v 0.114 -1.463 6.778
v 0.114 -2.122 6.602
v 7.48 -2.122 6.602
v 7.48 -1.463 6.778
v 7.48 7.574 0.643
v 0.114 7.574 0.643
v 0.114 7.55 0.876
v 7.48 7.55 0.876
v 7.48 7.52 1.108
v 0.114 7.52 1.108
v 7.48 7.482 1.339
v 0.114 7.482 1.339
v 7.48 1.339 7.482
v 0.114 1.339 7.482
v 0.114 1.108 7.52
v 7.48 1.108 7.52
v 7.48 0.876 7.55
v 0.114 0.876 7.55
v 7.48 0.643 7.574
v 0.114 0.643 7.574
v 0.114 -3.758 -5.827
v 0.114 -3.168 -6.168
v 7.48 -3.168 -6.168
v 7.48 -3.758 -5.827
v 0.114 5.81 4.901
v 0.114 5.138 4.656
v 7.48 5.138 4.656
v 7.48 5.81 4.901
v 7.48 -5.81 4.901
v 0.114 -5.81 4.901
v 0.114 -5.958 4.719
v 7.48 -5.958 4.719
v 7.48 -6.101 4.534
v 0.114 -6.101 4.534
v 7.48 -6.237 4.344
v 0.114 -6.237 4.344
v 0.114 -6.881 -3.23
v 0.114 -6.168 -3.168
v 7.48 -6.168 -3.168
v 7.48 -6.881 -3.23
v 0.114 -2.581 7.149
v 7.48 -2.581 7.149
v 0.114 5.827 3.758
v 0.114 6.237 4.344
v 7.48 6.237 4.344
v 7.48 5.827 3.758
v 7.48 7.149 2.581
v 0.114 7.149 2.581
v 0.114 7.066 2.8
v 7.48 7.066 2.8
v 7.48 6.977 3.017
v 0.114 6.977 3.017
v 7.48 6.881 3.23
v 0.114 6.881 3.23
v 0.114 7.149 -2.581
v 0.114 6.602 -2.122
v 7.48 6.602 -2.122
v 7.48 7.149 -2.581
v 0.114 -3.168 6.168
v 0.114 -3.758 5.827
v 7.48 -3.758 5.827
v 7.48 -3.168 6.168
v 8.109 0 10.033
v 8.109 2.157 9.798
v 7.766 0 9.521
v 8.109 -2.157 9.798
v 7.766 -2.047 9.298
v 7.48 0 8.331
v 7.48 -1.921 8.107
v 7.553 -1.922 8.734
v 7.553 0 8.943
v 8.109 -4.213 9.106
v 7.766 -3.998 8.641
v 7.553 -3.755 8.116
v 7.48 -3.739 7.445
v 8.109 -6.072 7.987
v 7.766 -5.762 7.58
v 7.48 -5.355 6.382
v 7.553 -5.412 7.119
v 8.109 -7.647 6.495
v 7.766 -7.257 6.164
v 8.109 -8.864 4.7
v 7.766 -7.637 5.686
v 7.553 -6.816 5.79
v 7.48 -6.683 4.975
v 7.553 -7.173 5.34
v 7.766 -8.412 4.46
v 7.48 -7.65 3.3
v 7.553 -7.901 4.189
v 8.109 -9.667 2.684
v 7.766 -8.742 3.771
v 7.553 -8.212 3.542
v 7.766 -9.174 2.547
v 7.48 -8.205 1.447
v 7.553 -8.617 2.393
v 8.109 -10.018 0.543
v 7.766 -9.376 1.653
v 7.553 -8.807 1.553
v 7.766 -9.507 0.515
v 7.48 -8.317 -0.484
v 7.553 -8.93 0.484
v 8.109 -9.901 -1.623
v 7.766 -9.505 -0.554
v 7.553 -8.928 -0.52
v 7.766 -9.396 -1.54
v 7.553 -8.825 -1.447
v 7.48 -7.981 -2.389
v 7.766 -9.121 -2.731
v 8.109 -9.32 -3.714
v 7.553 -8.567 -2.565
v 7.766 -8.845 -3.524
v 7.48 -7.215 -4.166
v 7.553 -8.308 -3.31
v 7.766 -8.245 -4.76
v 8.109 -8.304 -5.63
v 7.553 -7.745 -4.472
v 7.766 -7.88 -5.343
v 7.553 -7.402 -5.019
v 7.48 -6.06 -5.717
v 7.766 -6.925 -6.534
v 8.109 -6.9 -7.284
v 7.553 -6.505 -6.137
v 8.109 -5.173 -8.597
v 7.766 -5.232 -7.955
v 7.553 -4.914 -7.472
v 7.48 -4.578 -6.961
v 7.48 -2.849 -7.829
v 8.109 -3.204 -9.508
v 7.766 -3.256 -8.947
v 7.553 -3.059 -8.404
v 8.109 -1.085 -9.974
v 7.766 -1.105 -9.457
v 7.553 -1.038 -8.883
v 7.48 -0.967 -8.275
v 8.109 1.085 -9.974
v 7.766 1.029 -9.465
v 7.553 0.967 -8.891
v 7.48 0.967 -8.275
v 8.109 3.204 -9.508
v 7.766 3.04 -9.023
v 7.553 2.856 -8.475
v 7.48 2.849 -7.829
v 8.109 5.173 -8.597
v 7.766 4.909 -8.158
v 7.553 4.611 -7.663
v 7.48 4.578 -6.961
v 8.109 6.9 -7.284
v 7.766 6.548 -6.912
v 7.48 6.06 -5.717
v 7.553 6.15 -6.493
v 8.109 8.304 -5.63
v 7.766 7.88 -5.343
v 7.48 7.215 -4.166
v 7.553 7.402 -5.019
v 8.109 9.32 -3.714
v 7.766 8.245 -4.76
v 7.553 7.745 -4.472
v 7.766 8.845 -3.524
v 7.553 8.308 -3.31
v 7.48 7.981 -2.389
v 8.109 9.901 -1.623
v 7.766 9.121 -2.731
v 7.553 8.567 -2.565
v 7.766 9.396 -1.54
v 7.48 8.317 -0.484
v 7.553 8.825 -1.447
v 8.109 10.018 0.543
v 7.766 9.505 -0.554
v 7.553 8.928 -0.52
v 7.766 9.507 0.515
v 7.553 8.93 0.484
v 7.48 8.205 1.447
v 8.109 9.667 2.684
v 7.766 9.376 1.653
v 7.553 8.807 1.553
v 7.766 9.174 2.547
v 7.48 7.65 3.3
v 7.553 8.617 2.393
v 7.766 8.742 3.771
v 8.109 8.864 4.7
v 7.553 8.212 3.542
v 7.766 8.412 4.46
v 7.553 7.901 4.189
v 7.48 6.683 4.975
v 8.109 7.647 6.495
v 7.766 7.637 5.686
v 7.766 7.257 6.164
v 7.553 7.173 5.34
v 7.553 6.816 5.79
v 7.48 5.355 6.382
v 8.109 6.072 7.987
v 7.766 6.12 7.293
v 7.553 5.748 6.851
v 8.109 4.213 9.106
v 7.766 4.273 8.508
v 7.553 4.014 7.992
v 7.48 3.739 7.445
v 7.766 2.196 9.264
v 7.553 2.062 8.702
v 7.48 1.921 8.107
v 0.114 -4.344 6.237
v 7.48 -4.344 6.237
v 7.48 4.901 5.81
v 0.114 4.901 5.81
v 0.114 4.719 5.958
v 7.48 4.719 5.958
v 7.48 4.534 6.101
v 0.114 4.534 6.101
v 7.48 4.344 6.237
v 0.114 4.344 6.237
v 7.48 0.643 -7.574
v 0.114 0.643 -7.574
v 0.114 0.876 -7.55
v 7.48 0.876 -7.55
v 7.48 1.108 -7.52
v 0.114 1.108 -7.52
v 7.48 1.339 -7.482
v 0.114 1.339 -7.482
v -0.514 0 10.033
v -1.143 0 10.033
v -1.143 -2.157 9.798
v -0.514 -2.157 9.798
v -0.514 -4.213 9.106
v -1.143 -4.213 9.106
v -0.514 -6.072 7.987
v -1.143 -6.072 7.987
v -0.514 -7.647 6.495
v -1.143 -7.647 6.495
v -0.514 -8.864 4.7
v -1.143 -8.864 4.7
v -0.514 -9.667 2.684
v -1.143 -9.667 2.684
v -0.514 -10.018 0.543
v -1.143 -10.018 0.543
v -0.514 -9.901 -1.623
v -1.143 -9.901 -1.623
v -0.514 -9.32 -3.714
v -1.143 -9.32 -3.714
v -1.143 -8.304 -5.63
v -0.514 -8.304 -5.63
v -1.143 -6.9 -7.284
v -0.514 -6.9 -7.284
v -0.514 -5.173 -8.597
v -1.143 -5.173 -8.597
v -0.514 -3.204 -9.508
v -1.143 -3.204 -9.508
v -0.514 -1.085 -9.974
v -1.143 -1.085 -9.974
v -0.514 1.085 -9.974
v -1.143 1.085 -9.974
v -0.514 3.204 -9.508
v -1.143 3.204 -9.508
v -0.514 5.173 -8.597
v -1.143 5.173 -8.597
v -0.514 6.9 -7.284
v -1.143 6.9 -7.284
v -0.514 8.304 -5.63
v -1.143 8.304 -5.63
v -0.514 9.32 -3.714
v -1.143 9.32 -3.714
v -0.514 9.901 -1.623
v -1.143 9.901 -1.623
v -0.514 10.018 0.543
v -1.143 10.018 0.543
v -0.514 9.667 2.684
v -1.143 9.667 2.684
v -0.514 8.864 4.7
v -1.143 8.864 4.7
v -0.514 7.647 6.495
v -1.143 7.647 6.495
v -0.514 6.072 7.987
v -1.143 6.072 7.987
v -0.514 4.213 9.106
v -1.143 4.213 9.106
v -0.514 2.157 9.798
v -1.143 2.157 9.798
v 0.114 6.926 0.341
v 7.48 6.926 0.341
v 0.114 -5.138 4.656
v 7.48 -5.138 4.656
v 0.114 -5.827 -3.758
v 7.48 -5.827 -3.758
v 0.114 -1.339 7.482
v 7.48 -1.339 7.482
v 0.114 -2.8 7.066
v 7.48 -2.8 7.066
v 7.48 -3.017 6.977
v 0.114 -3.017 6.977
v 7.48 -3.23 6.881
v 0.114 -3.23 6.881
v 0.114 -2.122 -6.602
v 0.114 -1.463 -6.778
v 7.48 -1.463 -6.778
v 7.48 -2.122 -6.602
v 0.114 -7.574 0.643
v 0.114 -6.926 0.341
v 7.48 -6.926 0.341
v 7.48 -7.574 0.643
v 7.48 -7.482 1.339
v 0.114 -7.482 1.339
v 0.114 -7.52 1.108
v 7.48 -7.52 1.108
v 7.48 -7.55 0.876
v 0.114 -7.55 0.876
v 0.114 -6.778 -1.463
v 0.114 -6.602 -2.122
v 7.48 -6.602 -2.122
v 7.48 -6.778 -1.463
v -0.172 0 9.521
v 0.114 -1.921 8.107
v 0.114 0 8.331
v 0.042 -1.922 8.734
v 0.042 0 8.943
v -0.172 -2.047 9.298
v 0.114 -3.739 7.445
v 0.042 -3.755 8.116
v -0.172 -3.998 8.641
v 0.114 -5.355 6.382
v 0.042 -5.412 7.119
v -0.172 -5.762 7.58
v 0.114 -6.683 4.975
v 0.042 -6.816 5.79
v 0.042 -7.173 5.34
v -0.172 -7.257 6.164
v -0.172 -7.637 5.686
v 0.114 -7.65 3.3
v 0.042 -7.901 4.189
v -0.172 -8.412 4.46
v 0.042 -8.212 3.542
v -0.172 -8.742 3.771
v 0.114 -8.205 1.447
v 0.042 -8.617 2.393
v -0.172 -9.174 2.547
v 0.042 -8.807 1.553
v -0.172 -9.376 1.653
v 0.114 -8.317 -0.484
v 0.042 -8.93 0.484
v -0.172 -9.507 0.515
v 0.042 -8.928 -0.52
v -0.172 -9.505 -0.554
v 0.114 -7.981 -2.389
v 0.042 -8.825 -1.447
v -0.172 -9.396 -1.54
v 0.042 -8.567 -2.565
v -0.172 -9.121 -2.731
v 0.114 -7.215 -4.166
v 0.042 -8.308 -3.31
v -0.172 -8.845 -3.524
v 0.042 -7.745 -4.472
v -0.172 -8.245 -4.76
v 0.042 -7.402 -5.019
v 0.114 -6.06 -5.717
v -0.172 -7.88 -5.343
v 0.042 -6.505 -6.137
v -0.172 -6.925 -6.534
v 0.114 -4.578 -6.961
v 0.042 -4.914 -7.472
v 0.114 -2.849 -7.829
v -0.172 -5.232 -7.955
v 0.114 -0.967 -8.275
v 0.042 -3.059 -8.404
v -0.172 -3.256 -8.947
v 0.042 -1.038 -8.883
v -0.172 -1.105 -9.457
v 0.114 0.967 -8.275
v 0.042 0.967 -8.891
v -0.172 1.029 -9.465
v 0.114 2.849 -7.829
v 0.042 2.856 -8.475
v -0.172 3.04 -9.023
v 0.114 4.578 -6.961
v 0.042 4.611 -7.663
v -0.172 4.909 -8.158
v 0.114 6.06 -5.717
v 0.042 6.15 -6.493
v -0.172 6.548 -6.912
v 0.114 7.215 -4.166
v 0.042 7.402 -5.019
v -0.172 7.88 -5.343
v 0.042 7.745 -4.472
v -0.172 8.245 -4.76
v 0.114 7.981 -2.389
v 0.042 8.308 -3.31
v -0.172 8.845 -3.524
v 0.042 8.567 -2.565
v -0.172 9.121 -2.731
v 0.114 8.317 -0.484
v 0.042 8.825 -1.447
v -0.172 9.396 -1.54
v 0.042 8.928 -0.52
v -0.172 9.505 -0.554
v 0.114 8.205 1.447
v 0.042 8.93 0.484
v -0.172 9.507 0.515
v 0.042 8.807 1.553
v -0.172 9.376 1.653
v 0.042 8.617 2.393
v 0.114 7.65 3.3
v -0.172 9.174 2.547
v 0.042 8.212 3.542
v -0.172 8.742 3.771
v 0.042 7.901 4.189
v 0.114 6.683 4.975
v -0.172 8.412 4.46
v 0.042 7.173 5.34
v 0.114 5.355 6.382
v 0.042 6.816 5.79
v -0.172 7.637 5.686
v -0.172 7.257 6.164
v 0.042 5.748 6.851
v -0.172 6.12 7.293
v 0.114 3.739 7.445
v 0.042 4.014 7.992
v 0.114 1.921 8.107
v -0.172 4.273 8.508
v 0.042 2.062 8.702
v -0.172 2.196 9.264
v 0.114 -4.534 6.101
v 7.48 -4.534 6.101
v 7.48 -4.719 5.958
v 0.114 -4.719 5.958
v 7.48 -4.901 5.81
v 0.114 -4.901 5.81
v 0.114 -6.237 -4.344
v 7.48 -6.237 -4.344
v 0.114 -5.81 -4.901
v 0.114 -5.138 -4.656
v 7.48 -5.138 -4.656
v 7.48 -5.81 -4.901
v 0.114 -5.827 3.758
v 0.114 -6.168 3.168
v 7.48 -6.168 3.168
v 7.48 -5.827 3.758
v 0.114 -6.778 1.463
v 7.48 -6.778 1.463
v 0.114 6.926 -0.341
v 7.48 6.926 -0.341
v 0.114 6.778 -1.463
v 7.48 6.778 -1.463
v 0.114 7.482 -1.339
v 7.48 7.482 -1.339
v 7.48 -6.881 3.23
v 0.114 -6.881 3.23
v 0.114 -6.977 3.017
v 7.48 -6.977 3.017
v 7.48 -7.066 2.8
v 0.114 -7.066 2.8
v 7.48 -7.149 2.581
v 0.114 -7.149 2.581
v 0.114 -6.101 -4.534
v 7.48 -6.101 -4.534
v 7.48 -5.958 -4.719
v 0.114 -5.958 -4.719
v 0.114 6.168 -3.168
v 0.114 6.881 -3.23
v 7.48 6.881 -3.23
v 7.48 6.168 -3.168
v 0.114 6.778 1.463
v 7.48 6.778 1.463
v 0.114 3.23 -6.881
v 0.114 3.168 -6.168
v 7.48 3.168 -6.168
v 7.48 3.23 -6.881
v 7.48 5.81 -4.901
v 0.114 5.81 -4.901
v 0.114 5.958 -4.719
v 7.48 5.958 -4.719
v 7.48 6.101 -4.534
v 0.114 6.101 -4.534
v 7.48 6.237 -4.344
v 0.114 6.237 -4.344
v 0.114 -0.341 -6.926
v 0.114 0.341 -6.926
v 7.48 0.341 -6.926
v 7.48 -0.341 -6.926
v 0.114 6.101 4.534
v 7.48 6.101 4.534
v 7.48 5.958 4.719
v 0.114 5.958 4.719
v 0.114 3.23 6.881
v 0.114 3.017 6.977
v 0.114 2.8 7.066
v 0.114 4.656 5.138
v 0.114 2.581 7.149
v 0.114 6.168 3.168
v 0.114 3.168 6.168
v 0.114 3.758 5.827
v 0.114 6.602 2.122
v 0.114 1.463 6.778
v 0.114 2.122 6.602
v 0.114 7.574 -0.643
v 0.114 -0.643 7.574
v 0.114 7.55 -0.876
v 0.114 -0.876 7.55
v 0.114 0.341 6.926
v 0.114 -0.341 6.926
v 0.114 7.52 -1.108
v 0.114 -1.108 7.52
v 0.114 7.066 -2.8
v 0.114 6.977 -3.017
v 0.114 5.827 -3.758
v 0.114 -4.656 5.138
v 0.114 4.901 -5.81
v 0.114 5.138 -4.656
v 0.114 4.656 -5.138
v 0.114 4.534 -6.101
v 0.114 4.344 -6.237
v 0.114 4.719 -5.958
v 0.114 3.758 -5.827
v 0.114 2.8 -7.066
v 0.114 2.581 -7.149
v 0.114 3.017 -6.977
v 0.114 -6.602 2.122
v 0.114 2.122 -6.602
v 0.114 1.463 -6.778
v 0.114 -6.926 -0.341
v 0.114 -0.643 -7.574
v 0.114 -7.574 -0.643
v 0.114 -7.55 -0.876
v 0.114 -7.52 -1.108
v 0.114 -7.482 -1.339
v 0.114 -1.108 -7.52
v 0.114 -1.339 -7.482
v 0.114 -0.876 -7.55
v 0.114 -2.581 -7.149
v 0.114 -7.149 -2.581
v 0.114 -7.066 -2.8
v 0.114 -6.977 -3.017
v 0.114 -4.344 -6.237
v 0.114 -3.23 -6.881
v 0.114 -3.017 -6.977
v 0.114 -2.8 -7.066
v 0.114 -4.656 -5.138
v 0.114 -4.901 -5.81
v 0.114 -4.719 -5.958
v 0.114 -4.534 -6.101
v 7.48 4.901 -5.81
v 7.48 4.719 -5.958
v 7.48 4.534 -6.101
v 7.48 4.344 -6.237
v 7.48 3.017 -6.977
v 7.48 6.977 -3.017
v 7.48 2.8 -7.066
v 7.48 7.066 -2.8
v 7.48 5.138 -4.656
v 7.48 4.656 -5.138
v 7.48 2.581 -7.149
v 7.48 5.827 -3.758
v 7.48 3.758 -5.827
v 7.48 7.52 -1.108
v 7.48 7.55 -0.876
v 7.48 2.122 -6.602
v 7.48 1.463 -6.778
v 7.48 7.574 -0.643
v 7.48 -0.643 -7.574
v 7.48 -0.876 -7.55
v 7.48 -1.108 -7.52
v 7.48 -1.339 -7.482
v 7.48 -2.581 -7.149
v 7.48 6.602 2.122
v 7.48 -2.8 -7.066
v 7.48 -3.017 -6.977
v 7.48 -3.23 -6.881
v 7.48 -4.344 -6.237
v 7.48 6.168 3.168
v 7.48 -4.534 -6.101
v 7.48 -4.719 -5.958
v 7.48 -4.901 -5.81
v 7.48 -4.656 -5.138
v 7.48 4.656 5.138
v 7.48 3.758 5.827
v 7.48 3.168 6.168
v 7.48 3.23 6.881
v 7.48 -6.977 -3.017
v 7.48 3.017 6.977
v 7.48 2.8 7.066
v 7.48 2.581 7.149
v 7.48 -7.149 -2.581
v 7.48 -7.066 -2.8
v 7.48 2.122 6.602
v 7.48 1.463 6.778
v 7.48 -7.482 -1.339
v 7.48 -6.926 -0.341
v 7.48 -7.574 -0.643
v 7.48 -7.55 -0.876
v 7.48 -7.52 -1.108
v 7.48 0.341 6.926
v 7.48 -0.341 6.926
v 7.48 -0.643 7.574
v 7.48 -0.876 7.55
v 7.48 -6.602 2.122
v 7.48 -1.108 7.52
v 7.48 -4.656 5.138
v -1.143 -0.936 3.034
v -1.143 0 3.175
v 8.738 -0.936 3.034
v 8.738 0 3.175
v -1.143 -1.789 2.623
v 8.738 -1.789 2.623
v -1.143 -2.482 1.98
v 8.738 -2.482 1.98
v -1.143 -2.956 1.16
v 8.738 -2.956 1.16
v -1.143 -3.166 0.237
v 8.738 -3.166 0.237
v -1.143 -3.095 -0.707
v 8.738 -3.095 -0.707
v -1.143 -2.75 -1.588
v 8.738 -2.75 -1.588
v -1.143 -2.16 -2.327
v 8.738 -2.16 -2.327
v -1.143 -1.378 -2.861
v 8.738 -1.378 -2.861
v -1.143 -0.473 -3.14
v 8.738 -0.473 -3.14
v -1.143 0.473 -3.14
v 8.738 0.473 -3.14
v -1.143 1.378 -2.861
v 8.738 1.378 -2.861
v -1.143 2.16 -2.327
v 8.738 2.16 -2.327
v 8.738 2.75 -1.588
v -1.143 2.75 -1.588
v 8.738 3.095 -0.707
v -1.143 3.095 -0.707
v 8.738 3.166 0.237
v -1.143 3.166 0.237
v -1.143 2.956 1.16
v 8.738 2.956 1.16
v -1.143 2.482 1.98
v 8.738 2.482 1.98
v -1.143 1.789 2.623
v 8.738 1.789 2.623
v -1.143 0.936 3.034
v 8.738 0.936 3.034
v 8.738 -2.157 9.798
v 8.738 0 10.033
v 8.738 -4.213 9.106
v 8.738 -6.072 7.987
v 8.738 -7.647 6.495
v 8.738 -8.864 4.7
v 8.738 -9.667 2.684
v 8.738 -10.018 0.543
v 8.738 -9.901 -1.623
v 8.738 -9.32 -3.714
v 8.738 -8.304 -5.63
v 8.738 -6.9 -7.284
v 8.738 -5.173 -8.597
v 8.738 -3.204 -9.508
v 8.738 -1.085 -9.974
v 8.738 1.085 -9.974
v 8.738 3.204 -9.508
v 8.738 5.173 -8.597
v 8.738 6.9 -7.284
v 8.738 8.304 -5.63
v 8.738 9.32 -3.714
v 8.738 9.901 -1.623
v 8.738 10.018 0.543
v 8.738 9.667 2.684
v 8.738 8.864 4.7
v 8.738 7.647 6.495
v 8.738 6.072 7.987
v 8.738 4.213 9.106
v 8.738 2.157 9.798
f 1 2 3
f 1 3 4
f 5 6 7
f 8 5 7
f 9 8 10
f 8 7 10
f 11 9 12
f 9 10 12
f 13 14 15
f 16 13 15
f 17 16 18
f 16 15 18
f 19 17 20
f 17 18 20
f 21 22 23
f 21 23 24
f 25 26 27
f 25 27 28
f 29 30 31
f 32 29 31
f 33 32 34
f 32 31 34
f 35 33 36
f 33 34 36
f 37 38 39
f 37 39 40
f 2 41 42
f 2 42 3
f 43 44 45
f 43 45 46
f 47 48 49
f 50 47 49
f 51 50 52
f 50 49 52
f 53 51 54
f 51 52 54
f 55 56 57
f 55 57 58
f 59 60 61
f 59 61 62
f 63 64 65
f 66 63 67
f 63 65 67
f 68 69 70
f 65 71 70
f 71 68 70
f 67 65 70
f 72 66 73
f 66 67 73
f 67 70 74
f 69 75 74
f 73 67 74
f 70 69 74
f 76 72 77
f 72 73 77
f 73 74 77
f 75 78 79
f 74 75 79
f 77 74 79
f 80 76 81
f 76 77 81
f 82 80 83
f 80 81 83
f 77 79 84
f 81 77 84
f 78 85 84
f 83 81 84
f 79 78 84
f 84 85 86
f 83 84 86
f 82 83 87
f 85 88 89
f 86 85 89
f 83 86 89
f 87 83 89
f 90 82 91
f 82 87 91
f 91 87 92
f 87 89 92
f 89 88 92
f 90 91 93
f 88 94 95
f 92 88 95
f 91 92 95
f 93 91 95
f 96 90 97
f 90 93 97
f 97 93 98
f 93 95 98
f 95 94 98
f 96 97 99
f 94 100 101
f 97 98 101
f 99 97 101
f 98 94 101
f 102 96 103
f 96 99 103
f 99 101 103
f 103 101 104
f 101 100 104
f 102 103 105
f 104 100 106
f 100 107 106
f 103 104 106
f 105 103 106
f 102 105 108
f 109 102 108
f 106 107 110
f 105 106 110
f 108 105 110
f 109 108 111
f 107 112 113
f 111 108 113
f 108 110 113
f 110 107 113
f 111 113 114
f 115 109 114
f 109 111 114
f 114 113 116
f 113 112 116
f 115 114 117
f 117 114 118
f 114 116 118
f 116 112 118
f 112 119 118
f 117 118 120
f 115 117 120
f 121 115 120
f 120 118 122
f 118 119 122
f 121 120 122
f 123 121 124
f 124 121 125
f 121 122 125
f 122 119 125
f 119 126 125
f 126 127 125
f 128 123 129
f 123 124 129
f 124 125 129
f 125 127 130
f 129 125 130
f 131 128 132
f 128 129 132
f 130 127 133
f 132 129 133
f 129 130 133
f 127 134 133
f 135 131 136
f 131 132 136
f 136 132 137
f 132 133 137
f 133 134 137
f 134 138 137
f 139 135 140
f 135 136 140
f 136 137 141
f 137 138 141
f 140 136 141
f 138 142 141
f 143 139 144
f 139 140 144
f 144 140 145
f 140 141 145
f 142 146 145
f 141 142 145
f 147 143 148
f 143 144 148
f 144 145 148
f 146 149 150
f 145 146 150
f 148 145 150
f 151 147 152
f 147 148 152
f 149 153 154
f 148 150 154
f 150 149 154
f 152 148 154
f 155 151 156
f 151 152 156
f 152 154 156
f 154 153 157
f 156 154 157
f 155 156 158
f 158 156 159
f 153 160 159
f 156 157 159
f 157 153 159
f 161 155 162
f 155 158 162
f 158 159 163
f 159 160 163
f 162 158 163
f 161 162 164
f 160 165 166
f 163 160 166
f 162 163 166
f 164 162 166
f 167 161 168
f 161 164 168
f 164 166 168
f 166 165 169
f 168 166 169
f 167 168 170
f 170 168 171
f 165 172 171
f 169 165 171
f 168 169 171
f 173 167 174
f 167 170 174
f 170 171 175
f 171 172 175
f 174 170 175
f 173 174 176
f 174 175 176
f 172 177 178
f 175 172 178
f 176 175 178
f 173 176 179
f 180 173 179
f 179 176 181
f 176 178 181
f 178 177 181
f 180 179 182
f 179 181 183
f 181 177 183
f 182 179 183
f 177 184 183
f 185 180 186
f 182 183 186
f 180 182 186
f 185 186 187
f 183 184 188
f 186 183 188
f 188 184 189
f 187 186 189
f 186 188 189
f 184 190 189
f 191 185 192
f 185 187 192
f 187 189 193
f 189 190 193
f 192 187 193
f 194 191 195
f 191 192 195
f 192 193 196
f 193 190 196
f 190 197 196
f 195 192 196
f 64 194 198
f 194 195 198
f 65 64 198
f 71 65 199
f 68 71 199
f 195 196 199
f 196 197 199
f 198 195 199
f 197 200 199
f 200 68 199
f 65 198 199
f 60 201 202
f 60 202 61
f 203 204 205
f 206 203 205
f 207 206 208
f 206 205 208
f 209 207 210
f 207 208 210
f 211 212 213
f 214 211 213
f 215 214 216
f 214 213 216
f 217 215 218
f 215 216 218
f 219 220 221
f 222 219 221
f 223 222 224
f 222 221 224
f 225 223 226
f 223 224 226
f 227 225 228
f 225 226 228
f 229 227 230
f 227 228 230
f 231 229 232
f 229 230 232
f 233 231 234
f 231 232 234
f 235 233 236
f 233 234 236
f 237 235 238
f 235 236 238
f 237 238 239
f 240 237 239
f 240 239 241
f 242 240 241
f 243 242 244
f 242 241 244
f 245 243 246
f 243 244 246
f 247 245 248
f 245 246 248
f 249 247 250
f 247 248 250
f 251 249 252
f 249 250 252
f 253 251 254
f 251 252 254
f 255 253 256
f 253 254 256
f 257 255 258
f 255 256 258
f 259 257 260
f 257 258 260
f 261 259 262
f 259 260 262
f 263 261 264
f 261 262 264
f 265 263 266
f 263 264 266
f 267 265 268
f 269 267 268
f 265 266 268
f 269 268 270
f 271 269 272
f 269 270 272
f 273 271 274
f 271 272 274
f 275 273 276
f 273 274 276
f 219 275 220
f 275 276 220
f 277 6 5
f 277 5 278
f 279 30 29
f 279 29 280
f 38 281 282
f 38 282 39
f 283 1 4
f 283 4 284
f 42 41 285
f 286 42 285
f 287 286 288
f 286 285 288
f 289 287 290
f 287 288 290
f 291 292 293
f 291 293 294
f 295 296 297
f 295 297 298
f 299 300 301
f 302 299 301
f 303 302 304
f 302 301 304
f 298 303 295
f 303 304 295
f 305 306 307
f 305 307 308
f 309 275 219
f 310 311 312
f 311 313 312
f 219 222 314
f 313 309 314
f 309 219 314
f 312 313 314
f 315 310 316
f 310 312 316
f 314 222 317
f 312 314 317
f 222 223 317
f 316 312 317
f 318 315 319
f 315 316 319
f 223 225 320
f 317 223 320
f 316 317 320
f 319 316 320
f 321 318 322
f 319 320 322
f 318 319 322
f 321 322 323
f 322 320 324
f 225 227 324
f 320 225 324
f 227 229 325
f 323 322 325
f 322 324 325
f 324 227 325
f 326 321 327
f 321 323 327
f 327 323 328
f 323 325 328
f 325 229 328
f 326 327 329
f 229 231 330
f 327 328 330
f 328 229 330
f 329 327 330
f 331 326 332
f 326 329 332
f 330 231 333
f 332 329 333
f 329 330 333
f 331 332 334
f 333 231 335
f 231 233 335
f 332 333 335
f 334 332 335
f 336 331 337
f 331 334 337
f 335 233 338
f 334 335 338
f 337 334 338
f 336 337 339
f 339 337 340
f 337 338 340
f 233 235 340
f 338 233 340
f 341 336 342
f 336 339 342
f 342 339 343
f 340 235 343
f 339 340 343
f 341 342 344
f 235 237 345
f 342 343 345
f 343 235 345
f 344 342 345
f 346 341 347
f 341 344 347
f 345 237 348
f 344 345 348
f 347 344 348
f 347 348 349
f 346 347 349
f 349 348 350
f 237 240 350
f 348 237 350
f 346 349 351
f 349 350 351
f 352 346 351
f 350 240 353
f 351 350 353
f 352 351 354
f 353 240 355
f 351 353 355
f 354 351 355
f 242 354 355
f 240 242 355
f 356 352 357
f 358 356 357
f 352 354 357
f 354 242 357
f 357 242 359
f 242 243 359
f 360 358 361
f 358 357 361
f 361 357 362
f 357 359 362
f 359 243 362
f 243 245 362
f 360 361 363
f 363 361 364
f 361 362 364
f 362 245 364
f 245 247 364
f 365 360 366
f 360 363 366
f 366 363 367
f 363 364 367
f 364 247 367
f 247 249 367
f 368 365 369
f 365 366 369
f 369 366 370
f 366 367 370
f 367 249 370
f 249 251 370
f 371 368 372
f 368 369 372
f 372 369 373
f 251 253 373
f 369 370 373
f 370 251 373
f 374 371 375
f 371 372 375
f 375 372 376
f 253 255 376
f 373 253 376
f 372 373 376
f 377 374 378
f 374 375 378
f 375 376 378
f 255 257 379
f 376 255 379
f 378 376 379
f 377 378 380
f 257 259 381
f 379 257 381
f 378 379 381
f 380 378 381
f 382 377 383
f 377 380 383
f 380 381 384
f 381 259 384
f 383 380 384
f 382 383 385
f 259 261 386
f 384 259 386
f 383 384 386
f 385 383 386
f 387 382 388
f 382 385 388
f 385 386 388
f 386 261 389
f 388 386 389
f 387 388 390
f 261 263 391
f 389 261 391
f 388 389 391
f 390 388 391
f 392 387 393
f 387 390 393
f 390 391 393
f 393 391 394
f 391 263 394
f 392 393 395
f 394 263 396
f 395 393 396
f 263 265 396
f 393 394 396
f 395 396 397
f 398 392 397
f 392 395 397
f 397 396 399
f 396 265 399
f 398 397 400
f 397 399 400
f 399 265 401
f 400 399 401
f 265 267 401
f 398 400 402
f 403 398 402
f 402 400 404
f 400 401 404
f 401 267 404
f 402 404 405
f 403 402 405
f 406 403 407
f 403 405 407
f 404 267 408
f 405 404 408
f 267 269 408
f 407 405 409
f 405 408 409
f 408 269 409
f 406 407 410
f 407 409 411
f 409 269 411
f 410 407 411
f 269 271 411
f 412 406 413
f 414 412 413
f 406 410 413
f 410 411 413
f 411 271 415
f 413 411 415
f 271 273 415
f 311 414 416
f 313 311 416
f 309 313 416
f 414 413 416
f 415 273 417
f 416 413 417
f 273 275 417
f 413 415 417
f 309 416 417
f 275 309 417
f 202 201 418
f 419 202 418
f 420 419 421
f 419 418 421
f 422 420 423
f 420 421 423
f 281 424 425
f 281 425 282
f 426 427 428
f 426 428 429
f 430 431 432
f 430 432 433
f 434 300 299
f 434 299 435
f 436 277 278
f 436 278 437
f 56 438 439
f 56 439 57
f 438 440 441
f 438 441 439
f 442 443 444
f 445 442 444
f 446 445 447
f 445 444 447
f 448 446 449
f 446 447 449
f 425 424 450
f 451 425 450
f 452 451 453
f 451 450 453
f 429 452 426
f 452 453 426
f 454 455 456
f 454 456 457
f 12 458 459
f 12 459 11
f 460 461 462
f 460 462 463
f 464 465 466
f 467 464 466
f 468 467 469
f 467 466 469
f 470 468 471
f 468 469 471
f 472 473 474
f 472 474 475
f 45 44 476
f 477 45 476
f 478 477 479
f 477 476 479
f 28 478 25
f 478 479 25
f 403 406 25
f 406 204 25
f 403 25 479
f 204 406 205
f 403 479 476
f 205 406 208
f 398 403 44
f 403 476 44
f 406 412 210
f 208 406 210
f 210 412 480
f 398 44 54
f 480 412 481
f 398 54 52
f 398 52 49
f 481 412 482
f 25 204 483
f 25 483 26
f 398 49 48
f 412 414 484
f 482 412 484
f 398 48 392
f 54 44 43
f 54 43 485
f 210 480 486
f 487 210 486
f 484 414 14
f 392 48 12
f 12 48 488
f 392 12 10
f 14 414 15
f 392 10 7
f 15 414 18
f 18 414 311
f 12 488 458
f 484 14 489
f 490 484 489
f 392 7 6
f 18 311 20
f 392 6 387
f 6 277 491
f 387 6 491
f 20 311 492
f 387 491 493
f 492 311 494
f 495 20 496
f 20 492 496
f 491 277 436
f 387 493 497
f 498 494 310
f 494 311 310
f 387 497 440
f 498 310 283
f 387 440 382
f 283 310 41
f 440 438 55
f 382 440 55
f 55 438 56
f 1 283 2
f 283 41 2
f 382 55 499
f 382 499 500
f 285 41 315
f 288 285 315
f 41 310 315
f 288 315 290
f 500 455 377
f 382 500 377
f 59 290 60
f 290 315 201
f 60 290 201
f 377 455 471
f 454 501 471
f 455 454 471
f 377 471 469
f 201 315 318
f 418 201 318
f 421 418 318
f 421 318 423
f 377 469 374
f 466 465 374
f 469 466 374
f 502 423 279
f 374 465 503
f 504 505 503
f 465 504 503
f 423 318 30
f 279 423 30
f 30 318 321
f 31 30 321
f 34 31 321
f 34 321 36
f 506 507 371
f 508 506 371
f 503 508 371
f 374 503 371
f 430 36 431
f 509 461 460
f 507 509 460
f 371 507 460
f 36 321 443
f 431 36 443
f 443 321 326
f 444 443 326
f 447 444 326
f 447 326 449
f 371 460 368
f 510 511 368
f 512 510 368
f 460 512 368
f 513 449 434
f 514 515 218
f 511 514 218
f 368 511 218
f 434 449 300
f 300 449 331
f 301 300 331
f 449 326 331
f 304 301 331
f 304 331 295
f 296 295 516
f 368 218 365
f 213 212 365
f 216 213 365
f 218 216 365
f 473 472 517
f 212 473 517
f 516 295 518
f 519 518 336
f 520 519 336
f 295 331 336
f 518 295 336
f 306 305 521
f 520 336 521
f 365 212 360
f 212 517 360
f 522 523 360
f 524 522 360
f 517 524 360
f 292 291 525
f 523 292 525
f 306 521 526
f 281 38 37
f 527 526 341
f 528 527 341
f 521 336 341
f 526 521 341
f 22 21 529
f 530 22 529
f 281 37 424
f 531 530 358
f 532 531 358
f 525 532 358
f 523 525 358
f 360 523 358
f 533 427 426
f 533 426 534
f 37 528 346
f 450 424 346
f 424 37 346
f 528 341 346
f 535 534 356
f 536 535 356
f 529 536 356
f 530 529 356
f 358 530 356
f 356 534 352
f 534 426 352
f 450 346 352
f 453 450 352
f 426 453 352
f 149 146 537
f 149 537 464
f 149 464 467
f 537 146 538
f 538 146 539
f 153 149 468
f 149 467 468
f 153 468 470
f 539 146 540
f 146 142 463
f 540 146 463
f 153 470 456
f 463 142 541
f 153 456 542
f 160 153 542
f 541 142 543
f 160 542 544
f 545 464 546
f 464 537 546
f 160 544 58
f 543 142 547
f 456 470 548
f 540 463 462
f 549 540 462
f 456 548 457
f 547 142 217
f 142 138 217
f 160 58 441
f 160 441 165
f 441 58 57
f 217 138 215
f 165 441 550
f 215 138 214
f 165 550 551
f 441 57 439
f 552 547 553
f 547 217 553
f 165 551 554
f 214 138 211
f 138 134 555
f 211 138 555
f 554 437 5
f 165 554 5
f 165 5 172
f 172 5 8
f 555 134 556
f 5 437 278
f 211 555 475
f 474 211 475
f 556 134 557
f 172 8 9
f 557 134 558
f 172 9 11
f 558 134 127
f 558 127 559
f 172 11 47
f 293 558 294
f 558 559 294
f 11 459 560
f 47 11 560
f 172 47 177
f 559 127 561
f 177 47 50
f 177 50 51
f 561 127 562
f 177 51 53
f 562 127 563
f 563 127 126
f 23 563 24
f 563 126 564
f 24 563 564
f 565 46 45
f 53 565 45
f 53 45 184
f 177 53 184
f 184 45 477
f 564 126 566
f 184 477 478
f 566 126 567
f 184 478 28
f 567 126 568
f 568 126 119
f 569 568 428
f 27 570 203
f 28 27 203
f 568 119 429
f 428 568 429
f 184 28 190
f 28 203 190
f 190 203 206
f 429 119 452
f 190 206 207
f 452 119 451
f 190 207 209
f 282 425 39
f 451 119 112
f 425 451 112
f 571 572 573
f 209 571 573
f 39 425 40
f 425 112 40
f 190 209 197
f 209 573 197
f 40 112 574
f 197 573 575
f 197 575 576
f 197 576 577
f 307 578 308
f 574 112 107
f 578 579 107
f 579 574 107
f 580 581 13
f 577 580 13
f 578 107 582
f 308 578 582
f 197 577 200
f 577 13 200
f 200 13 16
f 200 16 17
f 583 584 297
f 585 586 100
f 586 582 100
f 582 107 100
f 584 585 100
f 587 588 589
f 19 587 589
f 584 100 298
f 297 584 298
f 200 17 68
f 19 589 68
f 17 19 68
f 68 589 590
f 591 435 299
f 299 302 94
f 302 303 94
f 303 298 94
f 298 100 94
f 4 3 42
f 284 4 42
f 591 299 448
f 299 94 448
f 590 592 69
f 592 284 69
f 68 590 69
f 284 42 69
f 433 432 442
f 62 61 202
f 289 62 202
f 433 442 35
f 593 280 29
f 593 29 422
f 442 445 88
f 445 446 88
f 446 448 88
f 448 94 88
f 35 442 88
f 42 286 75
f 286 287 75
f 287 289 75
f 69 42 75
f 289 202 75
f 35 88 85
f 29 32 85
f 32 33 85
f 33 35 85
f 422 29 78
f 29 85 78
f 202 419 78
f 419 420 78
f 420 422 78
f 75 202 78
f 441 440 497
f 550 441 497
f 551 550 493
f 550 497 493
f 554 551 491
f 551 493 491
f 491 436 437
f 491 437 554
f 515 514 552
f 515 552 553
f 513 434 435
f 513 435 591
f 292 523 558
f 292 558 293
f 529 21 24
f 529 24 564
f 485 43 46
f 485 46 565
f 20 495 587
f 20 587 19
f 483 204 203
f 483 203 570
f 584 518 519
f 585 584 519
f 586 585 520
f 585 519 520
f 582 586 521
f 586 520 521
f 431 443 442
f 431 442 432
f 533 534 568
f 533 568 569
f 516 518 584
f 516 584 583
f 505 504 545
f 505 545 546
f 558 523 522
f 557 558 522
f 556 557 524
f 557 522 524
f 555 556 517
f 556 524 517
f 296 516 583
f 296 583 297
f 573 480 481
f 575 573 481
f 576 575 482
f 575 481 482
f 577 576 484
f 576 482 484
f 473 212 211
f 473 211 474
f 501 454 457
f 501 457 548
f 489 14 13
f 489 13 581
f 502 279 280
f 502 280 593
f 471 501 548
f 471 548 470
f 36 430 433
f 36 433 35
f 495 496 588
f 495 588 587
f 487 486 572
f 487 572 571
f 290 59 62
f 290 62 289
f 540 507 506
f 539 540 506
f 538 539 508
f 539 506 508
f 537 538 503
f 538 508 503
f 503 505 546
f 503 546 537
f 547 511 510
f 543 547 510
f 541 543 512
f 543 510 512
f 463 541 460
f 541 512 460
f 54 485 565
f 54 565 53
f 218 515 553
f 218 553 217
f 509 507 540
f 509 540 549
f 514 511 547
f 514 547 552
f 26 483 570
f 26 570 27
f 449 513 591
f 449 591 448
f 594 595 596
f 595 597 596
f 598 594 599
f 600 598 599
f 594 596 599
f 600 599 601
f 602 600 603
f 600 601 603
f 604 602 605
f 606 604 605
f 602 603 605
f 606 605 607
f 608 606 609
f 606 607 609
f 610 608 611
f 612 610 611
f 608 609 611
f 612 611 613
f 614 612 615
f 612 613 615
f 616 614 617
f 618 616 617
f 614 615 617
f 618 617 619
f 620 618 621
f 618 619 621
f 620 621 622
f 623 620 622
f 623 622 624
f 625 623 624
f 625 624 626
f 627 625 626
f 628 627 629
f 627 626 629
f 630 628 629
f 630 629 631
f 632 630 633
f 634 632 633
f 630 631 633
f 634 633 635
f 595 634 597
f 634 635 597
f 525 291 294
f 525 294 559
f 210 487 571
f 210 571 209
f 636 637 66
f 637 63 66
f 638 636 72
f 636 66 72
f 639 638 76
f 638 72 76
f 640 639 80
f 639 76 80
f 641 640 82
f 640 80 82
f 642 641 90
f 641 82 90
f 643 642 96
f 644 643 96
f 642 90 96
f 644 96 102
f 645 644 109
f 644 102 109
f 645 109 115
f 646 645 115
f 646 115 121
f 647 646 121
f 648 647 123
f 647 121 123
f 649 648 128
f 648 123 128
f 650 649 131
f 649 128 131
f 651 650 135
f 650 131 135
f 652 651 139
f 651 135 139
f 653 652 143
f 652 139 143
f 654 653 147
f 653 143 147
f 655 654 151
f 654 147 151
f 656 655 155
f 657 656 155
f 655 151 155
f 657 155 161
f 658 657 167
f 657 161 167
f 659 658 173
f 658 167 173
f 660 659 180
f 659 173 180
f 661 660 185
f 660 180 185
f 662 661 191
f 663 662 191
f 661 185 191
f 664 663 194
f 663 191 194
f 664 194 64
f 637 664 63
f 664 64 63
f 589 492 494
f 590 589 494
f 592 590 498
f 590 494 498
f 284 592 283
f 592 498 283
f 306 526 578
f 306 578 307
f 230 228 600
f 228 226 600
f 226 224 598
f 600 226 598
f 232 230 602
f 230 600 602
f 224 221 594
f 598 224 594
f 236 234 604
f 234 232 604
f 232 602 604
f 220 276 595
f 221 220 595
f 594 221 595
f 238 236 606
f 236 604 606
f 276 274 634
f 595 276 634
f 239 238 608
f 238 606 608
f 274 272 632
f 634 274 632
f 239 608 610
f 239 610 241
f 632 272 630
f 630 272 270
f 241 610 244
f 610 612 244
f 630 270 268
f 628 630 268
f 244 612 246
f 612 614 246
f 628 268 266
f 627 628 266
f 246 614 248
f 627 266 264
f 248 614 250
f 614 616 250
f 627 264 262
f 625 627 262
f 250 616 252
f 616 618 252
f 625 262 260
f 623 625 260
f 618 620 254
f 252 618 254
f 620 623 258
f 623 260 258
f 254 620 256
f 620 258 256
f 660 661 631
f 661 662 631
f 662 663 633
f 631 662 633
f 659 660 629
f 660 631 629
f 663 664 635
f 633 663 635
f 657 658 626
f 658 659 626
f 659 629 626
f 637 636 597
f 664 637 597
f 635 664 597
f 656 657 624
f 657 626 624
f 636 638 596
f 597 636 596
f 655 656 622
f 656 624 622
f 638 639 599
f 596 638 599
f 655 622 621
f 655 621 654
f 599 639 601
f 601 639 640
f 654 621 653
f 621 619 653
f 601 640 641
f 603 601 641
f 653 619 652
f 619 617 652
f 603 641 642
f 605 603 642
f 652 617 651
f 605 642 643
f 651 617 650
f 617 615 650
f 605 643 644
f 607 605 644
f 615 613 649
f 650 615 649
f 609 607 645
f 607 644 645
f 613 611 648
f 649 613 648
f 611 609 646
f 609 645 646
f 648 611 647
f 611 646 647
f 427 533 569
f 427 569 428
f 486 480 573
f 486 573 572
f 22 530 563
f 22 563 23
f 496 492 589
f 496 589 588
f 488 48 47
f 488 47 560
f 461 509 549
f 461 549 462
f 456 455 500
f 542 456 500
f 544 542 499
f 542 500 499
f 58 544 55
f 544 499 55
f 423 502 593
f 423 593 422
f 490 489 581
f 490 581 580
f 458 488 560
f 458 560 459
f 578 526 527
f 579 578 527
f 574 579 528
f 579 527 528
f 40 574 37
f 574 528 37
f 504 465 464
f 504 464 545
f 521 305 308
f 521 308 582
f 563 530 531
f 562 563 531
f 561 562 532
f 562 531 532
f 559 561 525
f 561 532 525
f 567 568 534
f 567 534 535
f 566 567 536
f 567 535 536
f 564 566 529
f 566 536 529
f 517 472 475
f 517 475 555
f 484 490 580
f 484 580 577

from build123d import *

# Parameters (mm, degrees)
SKETCH4_R          = 7.7597
SKETCH4_R_2        = 7.60095
CUT_EXTRUDE2_DEPTH = 7.366
CUT_EXTRUDE1_DEPTH = 7.366
CIRPATTERN1_COUNT  = 24
SKETCH6_R          = 1.4605
CUT_EXTRUDE3_DEPTH = 17.66336796
CUT_EXTRUDE4_DEPTH = 1.016
CIRPATTERN2_COUNT  = 2
CIRPATTERN2_ANGLE  = 90
CIRPATTERN3_COUNT  = 2
CIRPATTERN3_ANGLE  = 90
SKETCH9_W          = 8.047950053
SKETCH9_H          = 15.828316952
CUT_EXTRUDE5_DEPTH = 7.62


with BuildPart() as part:
    # Sketch1 → Revolve1 (revolve)
    with BuildSketch(Plane.XY, mode=Mode.PRIVATE) as revolve1_sk:
        with BuildLine():
            Line((-8.7376, 3.175), (8.7376, 3.175))
            Line((8.7376, 3.175), (8.7376, 10.033))
            Line((8.7376, 10.033), (8.10895, 10.033))
            ThreePointArc((8.10895, 10.033), (7.642486723, 9.238300334), (7.4803, 8.3312))
            Line((7.4803, 8.3312), (7.4803, 7.7597))
            Line((7.4803, 7.7597), (0.1143, 7.7597))
            Line((0.1143, 7.7597), (0.1143, 8.3312))
            ThreePointArc((0.1143, 8.3312), (-0.047886723, 9.238300334), (-0.51435, 10.033))
            Line((-0.51435, 10.033), (-1.143, 10.033))
            Line((-1.143, 10.033), (-1.143, 5.6134))
            Line((-1.143, 5.6134), (-8.7376, 5.6134))
            Line((-8.7376, 5.6134), (-8.7376, 3.175))
        make_face()
    revolve(revolve1_sk.sketch.rotate(Axis((-8.7376, 0, 0), (1, 0, 0)), 90), axis=Axis((-8.7376, 0, 0), (1, 0, 0)))

    # Sketch4 → Cut-Extrude2 (cut)
    with BuildSketch(Plane(origin=(0.1143, 0, 0), x_dir=(0, 0, -1), z_dir=(1, 0, 0))):
        Circle(SKETCH4_R)
        Circle(SKETCH4_R_2, mode=Mode.SUBTRACT)
    extrude(amount=CUT_EXTRUDE2_DEPTH, mode=Mode.SUBTRACT)

    # Sketch3 → Cut-Extrude1 (cut)
    with BuildSketch(Plane(origin=(0.1143, 0, 0), x_dir=(0, 0, -1), z_dir=(1, 0, 0))):
        with BuildLine():
            Line((-0.643066132, 7.57369836), (-0.340952079, 6.925812683))
            Line((-0.340952079, 6.925812683), (0.340952079, 6.925812683))
            Line((0.340952079, 6.925812683), (0.643066132, 7.57369836))
            ThreePointArc((0.643066132, 7.57369836), (0, 7.60095), (-0.643066132, 7.57369836))
        make_face()
    cut_extrude1 = extrude(amount=CUT_EXTRUDE1_DEPTH, mode=Mode.SUBTRACT)

    # CirPattern1: Cut-Extrude1 ×24 about axis
    cirpattern1_axis = Axis((0, 0, 0), (1, 0, 0))
    for i in range(1, CIRPATTERN1_COUNT):
        add(cut_extrude1.rotate(cirpattern1_axis, i * 360 / CIRPATTERN1_COUNT), mode=Mode.SUBTRACT)

    # Sketch6 → Cut-Extrude3 (cut, through all)
    with BuildSketch(Plane(origin=(0, 0, 0), x_dir=(1, 0, 0), z_dir=(0, 1, 0))):
        with Locations(Location((-4.9403, 0, 0), (0, 0, 90))):
            Circle(SKETCH6_R)
    cut_extrude3 = extrude(amount=CUT_EXTRUDE3_DEPTH, mode=Mode.SUBTRACT)

    # CirPattern2: Cut-Extrude3 ×2 about axis
    cirpattern2_axis = Axis((-8.7376, 0, 0), (1, 0, 0))
    for i in range(1, CIRPATTERN2_COUNT):
        add(cut_extrude3.rotate(cirpattern2_axis, i * CIRPATTERN2_ANGLE / (CIRPATTERN2_COUNT - 1)), mode=Mode.SUBTRACT)


with BuildPart() as body_2:
    # Sketch7 → Revolve2 (revolve)
    with BuildSketch(Plane.XY, mode=Mode.PRIVATE) as revolve2_sk:
        Polygon((-6.1087, 5.6134), (-4.9403, 5.6134), (-4.9403, 3.556), (-6.1087, 3.556), (-6.3627, 3.81), (-6.3627, 5.3594), align=None)
    revolve(revolve2_sk.sketch.rotate(Axis((-4.9403, 3.556, 0), (0, 1, 0)), 270), axis=Axis((-4.9403, 3.556, 0), (0, 1, 0)))

    # Sketch8 → Cut-Extrude4 (cut)
    with BuildSketch(Plane(origin=(0, 5.6134, 0), x_dir=(1, 0, 0), z_dir=(0, 1, 0))):
        Polygon((-4.9403, 0.821223023), (-5.6515, 0.410611511), (-5.6515, -0.410611511), (-4.9403, -0.821223023), (-4.2291, -0.410611511), (-4.2291, 0.410611511), align=None)
    extrude(amount=-CUT_EXTRUDE4_DEPTH, mode=Mode.SUBTRACT)


with BuildPart() as cirpattern3_1:
    # CirPattern3: pattern copy
    add(body_2.part.rotate(Axis((0, 0, 0), (1, 0, 0)), 1 * CIRPATTERN3_ANGLE / (CIRPATTERN3_COUNT - 1)))


with BuildPart() as cut_extrude5_tool:
    # Sketch9 → Cut-Extrude5 (new, symmetric)
    with BuildSketch(Plane(origin=(0, 0, 0), x_dir=(1, 0, 0), z_dir=(0, 1, 0))):
        with Locations((-5.166975027, 0.16569051)):
            Rectangle(SKETCH9_W, SKETCH9_H)
    extrude(amount=CUT_EXTRUDE5_DEPTH, both=True)


with BuildPart() as part_1:
    add(part.part)

    # Cut-Extrude5: cut by cut_extrude5_tool
    add(cut_extrude5_tool.part, mode=Mode.SUBTRACT)


with BuildPart() as body_2_1:
    add(body_2.part)

    # Cut-Extrude5: cut by cut_extrude5_tool
    add(cut_extrude5_tool.part, mode=Mode.SUBTRACT)


with BuildPart() as cirpattern3_1_1:
    add(cirpattern3_1.part)

    # Cut-Extrude5: cut by cut_extrude5_tool
    add(cut_extrude5_tool.part, mode=Mode.SUBTRACT)


solid = part_1.part
